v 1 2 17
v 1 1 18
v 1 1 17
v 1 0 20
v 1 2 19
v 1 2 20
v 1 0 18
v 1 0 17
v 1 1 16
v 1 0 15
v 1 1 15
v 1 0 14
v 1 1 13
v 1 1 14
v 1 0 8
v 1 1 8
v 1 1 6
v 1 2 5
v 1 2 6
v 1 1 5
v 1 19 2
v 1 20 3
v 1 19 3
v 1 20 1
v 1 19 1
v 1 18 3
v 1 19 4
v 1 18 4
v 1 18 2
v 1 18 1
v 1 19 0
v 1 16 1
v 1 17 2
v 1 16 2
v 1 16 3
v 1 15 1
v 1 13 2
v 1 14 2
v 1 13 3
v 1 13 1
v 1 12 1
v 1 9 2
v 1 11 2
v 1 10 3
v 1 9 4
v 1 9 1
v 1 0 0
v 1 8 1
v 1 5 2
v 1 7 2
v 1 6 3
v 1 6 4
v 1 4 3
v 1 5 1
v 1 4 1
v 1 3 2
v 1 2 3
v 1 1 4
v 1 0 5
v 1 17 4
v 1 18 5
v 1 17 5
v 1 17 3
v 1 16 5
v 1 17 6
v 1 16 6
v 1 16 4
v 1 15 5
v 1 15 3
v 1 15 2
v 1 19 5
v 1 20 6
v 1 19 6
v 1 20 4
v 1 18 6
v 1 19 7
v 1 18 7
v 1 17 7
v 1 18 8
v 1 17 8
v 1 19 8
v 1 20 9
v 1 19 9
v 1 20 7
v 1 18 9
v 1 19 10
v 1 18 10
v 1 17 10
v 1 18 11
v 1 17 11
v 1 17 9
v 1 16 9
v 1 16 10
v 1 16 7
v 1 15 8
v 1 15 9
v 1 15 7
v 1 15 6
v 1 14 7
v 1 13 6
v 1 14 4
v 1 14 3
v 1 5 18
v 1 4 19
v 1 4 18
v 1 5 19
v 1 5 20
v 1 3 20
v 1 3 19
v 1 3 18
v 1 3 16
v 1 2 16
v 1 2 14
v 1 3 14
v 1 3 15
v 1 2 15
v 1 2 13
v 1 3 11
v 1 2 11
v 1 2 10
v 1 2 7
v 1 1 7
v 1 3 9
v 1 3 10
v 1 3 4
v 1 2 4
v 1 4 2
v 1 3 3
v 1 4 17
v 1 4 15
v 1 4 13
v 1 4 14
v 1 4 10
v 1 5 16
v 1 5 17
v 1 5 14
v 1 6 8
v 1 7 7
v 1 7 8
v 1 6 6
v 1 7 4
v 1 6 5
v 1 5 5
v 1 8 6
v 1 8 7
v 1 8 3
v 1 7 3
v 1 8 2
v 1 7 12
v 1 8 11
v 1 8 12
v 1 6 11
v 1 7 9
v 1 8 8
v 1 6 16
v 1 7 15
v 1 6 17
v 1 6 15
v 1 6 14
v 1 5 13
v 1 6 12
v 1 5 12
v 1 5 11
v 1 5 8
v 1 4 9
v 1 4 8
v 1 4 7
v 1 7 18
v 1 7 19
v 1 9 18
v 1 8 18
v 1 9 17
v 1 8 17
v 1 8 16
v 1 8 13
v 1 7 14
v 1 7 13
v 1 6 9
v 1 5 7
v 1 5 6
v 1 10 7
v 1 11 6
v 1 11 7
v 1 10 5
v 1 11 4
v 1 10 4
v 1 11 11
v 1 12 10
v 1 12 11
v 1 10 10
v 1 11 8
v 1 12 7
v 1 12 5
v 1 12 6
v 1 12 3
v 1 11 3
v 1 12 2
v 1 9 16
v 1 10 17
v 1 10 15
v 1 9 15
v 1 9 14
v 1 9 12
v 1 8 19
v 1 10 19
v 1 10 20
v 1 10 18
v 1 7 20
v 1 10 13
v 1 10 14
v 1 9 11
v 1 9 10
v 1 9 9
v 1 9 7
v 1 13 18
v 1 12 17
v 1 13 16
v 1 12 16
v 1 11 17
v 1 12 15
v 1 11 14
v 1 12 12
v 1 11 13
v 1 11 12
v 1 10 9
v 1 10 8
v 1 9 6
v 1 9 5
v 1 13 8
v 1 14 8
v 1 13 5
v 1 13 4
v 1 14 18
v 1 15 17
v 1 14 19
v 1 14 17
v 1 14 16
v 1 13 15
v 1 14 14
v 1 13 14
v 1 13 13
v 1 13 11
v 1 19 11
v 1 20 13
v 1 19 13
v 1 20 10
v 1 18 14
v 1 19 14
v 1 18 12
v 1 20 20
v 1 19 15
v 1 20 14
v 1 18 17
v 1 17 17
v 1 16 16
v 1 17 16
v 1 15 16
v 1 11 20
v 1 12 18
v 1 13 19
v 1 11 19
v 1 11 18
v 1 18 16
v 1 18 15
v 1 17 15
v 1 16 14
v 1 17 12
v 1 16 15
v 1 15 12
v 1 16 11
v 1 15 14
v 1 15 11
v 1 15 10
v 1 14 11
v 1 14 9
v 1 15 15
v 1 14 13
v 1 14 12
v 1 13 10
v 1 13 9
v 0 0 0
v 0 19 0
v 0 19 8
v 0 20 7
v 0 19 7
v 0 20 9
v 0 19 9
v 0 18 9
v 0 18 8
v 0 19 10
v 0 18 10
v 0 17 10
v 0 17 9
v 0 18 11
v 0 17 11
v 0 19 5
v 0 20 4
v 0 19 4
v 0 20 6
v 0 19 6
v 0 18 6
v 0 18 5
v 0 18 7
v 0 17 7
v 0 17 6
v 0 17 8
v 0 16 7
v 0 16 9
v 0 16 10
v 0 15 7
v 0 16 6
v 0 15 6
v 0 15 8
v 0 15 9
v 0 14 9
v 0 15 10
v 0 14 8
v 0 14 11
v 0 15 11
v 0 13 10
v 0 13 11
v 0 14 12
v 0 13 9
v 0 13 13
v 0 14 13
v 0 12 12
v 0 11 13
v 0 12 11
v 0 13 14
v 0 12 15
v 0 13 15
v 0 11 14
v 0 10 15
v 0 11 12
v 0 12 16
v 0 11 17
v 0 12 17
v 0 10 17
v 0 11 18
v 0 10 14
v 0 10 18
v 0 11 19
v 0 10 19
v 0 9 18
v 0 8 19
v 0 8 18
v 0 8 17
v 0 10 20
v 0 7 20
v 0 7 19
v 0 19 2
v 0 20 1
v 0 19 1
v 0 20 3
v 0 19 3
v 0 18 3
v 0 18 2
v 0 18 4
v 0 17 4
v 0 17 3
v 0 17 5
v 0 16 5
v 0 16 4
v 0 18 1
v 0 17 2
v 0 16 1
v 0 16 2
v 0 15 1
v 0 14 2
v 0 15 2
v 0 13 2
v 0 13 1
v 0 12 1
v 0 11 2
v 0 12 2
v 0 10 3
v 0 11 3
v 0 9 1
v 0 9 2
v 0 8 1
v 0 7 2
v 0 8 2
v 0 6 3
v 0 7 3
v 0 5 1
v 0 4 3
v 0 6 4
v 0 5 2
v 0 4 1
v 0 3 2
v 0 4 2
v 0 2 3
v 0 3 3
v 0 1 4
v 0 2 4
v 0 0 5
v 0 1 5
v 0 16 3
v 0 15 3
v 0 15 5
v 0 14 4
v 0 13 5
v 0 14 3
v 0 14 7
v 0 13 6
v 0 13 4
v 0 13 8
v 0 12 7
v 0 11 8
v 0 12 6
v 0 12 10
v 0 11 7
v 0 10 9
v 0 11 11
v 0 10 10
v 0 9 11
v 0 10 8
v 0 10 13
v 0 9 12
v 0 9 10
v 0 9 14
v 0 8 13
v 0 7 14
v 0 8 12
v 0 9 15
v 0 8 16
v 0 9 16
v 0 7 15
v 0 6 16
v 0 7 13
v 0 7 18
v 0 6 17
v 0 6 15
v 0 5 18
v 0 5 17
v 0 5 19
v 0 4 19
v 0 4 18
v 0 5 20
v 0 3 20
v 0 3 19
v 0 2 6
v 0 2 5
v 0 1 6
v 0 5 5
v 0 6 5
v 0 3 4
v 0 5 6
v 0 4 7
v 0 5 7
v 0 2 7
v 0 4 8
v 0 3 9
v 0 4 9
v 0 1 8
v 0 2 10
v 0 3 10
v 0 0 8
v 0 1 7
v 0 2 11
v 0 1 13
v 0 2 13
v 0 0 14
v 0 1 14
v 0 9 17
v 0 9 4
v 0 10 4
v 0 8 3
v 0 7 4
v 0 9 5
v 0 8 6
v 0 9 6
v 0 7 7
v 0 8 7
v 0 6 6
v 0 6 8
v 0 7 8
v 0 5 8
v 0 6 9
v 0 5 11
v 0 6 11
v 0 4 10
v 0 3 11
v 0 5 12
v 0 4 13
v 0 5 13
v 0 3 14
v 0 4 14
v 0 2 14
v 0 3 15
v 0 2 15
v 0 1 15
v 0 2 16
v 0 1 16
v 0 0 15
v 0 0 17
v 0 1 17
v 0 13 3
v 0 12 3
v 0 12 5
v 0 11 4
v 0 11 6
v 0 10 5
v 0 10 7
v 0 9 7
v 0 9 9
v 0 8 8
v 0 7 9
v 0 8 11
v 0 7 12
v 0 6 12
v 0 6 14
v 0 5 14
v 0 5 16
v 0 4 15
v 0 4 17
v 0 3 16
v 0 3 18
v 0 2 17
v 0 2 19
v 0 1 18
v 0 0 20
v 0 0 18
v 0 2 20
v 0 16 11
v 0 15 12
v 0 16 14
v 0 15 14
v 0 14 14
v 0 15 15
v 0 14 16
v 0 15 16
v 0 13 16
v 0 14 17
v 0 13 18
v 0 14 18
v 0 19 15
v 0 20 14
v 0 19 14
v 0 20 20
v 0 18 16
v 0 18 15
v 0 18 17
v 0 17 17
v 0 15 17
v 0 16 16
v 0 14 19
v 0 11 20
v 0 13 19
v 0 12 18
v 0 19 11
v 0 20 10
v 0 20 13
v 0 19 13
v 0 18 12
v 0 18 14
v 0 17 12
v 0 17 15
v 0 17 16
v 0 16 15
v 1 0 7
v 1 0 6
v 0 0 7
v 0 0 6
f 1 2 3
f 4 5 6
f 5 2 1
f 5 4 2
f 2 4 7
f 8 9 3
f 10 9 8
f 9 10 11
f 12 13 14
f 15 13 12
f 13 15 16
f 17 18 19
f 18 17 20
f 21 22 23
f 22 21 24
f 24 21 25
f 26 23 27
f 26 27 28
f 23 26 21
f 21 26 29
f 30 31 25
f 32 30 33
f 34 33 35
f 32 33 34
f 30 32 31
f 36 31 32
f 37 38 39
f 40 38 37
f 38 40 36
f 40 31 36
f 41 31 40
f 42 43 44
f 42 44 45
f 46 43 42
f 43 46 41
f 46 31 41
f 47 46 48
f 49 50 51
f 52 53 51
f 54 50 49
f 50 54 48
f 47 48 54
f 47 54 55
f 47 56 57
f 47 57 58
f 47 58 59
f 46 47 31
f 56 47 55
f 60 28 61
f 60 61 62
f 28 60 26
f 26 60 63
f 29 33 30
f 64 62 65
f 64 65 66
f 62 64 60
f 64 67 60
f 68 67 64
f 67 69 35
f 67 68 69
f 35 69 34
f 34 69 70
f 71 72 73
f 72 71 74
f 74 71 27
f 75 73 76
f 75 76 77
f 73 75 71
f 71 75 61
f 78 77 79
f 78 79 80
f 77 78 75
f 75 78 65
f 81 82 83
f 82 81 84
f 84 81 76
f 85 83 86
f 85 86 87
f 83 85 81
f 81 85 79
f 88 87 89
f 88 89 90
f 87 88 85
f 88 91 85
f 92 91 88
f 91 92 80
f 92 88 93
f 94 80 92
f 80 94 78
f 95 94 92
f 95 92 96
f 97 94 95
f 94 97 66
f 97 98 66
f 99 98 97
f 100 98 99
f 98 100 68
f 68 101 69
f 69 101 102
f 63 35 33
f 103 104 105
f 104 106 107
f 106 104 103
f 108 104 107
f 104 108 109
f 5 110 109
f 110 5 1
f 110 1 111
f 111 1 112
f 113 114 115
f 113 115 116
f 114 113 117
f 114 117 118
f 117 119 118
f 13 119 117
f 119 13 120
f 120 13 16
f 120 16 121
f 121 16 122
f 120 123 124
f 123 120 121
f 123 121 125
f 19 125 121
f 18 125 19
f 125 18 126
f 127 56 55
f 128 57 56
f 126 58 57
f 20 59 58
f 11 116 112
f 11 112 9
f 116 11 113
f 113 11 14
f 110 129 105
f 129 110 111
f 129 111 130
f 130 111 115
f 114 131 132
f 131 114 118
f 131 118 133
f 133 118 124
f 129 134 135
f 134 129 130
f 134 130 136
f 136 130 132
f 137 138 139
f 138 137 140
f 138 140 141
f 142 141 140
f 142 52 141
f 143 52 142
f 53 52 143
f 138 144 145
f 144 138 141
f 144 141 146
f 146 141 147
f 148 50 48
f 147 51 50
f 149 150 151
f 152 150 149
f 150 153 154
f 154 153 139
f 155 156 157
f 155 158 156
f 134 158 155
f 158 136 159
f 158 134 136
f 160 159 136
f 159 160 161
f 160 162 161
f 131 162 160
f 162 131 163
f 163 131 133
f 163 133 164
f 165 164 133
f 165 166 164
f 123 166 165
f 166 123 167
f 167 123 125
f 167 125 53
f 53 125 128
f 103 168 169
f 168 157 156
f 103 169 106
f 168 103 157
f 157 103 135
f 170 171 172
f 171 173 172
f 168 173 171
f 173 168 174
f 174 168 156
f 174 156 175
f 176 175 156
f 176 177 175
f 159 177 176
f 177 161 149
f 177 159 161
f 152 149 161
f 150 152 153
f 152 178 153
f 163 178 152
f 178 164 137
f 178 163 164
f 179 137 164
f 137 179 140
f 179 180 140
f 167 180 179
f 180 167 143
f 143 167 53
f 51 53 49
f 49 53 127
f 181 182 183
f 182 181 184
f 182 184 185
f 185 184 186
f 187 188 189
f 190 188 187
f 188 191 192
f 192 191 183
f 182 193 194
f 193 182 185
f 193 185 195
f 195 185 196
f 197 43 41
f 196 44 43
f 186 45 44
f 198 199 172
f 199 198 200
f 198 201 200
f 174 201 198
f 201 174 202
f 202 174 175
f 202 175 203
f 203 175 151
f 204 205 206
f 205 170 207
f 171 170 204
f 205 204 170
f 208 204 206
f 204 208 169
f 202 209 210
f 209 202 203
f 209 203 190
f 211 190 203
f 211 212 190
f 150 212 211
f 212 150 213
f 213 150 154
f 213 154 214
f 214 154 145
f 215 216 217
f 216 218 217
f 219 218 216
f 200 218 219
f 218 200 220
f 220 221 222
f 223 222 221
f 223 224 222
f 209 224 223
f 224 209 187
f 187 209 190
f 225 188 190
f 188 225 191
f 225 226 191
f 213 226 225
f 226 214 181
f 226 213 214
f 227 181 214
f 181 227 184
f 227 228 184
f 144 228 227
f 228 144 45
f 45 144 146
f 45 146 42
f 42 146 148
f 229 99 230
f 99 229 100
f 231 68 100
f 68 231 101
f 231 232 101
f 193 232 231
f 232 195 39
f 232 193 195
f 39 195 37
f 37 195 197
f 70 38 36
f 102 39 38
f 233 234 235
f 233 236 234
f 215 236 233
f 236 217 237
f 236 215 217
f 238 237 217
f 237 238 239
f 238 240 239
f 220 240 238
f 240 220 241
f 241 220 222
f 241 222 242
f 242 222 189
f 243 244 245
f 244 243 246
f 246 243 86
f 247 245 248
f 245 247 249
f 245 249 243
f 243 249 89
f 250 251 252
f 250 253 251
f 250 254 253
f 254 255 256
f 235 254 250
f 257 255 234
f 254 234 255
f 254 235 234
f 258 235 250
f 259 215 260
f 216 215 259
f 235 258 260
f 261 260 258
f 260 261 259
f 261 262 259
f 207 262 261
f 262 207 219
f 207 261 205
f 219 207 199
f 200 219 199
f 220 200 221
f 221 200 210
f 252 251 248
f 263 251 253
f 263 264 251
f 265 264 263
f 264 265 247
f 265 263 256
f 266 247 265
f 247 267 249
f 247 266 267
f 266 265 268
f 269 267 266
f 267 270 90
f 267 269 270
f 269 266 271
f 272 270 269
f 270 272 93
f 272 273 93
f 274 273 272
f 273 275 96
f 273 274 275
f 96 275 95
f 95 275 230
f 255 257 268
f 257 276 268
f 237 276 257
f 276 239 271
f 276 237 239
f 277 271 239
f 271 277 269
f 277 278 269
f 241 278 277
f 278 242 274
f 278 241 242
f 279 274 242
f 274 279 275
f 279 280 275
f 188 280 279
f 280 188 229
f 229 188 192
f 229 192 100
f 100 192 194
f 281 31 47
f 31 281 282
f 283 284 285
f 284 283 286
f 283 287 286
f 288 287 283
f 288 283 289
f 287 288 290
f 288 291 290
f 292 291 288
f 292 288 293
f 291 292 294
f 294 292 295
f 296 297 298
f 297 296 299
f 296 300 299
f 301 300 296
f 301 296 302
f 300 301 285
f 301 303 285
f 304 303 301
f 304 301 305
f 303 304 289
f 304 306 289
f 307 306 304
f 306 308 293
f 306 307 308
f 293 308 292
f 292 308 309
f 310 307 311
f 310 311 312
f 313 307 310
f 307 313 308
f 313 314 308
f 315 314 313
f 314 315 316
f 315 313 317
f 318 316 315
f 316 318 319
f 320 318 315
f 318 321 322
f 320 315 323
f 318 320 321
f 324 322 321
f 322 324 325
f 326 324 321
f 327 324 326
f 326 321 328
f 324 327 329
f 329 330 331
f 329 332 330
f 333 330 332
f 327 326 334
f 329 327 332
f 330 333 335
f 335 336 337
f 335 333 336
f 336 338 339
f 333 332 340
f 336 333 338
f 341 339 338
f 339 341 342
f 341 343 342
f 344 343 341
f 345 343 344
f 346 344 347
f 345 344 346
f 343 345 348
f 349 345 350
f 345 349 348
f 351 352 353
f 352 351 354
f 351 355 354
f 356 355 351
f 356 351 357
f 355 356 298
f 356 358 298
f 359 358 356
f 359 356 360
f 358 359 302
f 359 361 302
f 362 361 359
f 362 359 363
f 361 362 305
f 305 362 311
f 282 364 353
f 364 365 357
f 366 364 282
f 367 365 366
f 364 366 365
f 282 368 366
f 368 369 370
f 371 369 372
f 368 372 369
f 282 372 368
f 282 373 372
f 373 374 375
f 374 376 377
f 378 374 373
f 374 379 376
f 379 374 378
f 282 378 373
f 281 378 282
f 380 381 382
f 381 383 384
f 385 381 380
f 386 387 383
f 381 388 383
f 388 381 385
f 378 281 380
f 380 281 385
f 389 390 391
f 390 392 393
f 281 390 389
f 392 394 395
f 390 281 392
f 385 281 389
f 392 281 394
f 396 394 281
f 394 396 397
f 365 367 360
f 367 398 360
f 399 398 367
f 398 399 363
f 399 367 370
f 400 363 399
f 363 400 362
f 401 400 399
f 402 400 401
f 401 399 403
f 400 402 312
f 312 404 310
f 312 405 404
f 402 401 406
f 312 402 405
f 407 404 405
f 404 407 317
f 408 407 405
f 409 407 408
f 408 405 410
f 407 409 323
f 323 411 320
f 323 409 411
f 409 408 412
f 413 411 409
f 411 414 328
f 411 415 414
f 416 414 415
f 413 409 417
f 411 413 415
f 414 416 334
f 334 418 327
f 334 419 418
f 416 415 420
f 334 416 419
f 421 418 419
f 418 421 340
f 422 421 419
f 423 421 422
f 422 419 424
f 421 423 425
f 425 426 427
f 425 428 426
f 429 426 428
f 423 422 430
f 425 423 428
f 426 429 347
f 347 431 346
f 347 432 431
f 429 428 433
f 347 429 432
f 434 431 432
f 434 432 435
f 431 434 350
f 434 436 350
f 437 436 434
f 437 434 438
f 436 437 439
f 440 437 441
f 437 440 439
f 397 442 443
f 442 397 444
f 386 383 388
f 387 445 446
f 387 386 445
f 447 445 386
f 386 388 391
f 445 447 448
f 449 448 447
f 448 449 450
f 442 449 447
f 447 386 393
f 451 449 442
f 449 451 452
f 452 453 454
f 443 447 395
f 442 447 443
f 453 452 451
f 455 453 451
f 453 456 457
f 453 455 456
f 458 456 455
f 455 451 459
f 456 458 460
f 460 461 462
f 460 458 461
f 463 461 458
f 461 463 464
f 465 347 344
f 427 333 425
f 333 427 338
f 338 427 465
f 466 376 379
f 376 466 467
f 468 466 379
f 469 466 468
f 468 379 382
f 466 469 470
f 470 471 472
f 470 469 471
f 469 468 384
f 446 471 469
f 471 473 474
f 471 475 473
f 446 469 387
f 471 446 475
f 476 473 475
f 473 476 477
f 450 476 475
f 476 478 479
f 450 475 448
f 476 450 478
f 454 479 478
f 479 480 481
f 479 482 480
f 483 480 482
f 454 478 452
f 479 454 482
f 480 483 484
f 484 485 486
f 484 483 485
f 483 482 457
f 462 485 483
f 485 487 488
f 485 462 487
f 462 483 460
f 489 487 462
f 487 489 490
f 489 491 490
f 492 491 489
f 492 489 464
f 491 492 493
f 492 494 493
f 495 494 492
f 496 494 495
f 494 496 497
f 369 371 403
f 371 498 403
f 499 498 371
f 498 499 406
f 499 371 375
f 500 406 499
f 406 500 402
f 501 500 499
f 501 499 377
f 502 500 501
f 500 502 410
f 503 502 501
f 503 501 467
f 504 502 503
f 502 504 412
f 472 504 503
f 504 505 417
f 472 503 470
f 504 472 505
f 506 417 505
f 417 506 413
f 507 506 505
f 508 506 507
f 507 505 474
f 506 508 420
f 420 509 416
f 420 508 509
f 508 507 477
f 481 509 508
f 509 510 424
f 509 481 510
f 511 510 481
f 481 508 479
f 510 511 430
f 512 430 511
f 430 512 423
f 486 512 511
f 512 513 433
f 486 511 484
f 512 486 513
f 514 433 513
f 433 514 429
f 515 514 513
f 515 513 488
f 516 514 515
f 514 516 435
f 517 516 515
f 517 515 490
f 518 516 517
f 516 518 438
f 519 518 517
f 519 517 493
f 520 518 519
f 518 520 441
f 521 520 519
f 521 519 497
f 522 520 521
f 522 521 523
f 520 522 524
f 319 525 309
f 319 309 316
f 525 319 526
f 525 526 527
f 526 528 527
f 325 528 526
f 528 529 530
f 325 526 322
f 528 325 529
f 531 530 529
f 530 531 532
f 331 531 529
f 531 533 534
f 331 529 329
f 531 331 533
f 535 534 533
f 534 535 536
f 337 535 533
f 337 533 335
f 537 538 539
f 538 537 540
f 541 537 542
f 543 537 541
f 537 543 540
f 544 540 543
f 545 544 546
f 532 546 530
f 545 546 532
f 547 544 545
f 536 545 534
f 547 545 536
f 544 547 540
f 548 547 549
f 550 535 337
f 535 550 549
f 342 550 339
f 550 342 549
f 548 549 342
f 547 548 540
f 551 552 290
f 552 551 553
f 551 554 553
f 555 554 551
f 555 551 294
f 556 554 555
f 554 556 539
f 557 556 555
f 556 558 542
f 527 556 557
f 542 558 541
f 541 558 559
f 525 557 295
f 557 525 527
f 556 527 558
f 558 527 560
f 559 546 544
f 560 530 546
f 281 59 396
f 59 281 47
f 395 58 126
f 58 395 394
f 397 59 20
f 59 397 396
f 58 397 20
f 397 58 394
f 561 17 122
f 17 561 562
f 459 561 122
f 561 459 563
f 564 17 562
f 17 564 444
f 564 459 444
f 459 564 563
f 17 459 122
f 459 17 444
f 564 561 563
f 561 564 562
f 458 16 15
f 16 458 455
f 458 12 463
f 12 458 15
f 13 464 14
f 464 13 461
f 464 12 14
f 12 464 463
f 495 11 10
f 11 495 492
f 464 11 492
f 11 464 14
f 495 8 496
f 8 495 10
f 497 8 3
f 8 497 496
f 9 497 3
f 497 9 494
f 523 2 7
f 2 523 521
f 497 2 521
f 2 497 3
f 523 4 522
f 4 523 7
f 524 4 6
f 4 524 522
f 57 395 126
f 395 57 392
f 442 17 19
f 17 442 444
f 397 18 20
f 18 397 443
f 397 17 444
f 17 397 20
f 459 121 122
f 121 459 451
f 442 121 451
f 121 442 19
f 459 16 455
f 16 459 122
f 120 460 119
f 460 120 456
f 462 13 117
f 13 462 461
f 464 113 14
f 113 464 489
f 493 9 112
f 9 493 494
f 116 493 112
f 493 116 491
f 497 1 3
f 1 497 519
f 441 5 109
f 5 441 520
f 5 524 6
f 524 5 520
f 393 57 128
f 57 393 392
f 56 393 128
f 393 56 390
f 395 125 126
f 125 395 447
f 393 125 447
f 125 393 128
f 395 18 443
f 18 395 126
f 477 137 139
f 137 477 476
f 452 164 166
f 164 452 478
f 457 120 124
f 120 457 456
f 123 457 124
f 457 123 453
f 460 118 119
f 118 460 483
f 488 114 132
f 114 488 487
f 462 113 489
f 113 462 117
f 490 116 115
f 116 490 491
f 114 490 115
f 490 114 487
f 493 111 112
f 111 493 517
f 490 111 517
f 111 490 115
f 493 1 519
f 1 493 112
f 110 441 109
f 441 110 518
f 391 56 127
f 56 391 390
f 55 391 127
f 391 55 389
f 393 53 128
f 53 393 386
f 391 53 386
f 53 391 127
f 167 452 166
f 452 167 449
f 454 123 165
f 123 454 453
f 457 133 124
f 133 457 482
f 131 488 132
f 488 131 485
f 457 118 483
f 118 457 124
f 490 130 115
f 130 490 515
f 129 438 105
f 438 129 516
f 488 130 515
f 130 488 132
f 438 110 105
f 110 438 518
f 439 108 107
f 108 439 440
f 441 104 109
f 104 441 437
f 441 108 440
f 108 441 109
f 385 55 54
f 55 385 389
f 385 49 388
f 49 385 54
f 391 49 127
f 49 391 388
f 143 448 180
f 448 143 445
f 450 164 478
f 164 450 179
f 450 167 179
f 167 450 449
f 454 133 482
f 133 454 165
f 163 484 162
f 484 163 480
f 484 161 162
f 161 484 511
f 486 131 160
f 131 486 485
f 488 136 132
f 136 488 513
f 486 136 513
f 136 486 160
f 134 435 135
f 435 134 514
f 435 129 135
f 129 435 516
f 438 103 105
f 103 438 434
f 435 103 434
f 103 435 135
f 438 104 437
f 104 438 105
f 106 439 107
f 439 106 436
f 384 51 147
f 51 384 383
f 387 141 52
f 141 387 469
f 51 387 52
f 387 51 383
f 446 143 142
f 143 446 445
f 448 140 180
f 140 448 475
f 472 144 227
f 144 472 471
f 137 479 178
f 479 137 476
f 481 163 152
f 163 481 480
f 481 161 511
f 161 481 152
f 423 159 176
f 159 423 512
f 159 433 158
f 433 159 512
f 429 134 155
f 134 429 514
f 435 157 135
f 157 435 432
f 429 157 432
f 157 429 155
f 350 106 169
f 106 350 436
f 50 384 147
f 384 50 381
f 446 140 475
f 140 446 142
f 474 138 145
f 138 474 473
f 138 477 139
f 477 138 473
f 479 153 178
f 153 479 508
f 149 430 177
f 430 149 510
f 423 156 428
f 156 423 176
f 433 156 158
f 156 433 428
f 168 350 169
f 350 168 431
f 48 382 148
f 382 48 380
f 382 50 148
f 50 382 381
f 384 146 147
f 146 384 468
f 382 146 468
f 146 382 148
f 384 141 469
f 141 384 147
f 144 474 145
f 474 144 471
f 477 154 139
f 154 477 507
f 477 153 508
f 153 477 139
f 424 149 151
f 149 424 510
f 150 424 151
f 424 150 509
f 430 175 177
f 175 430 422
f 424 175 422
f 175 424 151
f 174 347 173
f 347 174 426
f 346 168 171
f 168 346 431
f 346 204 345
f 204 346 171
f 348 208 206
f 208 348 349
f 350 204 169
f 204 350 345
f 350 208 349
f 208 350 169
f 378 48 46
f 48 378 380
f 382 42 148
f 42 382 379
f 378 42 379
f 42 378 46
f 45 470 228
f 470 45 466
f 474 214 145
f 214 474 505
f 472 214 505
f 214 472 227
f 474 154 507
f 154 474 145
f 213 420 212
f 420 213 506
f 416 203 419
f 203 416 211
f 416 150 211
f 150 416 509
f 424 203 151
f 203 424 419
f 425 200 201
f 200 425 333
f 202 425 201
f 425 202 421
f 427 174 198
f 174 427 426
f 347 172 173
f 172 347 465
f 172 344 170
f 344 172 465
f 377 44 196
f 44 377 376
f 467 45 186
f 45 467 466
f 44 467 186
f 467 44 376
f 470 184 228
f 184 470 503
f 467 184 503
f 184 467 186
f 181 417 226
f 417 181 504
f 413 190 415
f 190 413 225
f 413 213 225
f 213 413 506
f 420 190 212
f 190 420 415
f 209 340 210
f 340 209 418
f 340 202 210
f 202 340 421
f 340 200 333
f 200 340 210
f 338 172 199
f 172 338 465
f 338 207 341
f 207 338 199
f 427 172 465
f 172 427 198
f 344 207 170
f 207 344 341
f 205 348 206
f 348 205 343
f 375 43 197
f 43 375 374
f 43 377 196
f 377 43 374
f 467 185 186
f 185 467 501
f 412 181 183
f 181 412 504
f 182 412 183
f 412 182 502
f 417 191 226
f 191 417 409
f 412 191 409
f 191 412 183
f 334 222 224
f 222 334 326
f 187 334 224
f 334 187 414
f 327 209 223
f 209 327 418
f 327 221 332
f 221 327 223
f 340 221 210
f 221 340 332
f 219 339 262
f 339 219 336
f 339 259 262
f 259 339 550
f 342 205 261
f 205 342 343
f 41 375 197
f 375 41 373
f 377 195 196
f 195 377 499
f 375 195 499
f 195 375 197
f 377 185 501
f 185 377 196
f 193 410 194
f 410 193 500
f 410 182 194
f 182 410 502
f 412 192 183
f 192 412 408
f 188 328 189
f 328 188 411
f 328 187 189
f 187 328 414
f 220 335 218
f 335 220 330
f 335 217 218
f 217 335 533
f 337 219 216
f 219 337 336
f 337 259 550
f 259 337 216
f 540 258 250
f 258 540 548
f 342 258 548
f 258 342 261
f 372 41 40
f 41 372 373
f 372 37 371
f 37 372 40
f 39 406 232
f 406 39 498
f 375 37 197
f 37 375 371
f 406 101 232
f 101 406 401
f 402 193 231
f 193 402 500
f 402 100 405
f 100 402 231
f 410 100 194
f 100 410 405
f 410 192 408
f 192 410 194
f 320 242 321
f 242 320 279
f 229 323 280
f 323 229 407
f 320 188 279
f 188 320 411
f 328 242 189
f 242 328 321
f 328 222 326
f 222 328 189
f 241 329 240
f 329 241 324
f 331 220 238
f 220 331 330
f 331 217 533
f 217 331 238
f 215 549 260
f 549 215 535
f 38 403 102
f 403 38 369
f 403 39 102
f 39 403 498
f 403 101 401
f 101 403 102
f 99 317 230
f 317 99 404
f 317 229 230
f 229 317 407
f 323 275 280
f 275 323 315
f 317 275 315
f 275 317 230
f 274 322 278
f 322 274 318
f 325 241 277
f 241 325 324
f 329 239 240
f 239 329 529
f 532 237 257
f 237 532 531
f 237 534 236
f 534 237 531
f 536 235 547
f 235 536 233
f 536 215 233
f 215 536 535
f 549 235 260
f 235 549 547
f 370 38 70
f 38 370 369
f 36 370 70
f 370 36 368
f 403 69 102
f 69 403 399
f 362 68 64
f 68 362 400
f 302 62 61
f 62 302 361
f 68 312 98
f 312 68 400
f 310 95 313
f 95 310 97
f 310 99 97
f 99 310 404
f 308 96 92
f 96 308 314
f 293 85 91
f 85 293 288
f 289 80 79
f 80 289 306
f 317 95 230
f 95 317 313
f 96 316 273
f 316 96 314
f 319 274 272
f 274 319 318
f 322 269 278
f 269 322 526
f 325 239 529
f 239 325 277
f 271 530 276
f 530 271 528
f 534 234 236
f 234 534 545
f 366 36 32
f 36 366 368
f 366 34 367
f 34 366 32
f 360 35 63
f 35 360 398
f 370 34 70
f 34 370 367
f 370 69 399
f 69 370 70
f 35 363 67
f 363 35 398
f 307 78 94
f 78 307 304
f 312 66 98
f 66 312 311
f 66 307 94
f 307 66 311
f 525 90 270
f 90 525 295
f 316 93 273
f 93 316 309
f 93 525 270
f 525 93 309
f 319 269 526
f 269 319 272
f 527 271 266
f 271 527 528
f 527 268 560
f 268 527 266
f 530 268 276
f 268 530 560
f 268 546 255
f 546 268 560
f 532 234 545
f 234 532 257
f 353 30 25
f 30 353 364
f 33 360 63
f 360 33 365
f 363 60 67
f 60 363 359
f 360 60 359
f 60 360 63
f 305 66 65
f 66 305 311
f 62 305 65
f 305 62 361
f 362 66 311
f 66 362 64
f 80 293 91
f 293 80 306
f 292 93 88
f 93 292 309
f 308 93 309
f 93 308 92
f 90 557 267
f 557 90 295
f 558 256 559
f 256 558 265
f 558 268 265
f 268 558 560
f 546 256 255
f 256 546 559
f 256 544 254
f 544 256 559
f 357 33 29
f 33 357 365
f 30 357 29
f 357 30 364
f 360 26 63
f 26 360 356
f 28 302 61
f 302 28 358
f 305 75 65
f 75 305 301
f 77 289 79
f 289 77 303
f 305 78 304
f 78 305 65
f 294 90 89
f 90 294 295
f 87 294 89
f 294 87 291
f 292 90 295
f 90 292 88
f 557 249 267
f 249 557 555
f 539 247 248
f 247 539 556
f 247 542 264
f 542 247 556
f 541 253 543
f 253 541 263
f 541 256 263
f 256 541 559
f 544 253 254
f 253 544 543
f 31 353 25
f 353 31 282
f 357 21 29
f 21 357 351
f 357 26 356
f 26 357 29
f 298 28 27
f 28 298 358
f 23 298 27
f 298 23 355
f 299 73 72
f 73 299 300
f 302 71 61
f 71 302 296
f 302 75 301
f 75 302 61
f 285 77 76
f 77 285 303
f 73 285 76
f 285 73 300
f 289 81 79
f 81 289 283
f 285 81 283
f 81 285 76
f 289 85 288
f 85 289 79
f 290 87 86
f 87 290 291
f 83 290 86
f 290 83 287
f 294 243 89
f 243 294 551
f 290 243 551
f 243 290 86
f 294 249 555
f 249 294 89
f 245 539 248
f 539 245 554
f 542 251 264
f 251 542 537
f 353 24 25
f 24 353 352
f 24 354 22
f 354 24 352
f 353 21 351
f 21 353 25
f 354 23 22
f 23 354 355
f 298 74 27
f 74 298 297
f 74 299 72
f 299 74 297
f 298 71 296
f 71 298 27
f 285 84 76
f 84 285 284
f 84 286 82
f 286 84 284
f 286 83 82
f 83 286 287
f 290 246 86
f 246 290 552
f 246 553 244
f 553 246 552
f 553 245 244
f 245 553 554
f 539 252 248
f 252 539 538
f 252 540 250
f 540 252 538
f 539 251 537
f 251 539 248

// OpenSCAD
union() {
    translate([0, 0, 0]) cube([1, 1, 1]);
    translate([0, 0, 1]) cube([1, 1, 1]);
    translate([0, 0, 2]) cube([1, 1, 1]);
    translate([0, 0, 3]) cube([1, 1, 1]);
    translate([0, 0, 4]) cube([1, 1, 1]);
    translate([0, 0, 6]) cube([1, 1, 1]);
    translate([0, 0, 8]) cube([1, 1, 1]);
    translate([0, 0, 9]) cube([1, 1, 1]);
    translate([0, 0, 10]) cube([1, 1, 1]);
    translate([0, 0, 11]) cube([1, 1, 1]);
    translate([0, 0, 12]) cube([1, 1, 1]);
    translate([0, 0, 13]) cube([1, 1, 1]);
    translate([0, 0, 15]) cube([1, 1, 1]);
    translate([0, 0, 16]) cube([1, 1, 1]);
    translate([0, 0, 18]) cube([1, 1, 1]);
    translate([0, 0, 19]) cube([1, 1, 1]);
    translate([0, 1, 0]) cube([1, 1, 1]);
    translate([0, 1, 1]) cube([1, 1, 1]);
    translate([0, 1, 2]) cube([1, 1, 1]);
    translate([0, 1, 3]) cube([1, 1, 1]);
    translate([0, 1, 5]) cube([1, 1, 1]);
    translate([0, 1, 7]) cube([1, 1, 1]);
    translate([0, 1, 8]) cube([1, 1, 1]);
    translate([0, 1, 9]) cube([1, 1, 1]);
    translate([0, 1, 10]) cube([1, 1, 1]);
    translate([0, 1, 11]) cube([1, 1, 1]);
    translate([0, 1, 12]) cube([1, 1, 1]);
    translate([0, 1, 14]) cube([1, 1, 1]);
    translate([0, 1, 15]) cube([1, 1, 1]);
    translate([0, 1, 17]) cube([1, 1, 1]);
    translate([0, 1, 18]) cube([1, 1, 1]);
    translate([0, 1, 19]) cube([1, 1, 1]);
    translate([0, 2, 0]) cube([1, 1, 1]);
    translate([0, 2, 1]) cube([1, 1, 1]);
    translate([0, 2, 2]) cube([1, 1, 1]);
    translate([0, 2, 4]) cube([1, 1, 1]);
    translate([0, 2, 5]) cube([1, 1, 1]);
    translate([0, 2, 6]) cube([1, 1, 1]);
    translate([0, 2, 7]) cube([1, 1, 1]);
    translate([0, 2, 8]) cube([1, 1, 1]);
    translate([0, 2, 9]) cube([1, 1, 1]);
    translate([0, 2, 11]) cube([1, 1, 1]);
    translate([0, 2, 12]) cube([1, 1, 1]);
    translate([0, 2, 13]) cube([1, 1, 1]);
    translate([0, 2, 14]) cube([1, 1, 1]);
    translate([0, 2, 16]) cube([1, 1, 1]);
    translate([0, 2, 17]) cube([1, 1, 1]);
    translate([0, 2, 18]) cube([1, 1, 1]);
    translate([0, 3, 0]) cube([1, 1, 1]);
    translate([0, 3, 1]) cube([1, 1, 1]);
    translate([0, 3, 3]) cube([1, 1, 1]);
    translate([0, 3, 4]) cube([1, 1, 1]);
    translate([0, 3, 5]) cube([1, 1, 1]);
    translate([0, 3, 6]) cube([1, 1, 1]);
    translate([0, 3, 7]) cube([1, 1, 1]);
    translate([0, 3, 8]) cube([1, 1, 1]);
    translate([0, 3, 10]) cube([1, 1, 1]);
    translate([0, 3, 11]) cube([1, 1, 1]);
    translate([0, 3, 12]) cube([1, 1, 1]);
    translate([0, 3, 13]) cube([1, 1, 1]);
    translate([0, 3, 15]) cube([1, 1, 1]);
    translate([0, 3, 16]) cube([1, 1, 1]);
    translate([0, 3, 17]) cube([1, 1, 1]);
    translate([0, 3, 19]) cube([1, 1, 1]);
    translate([0, 4, 0]) cube([1, 1, 1]);
    translate([0, 4, 2]) cube([1, 1, 1]);
    translate([0, 4, 3]) cube([1, 1, 1]);
    translate([0, 4, 4]) cube([1, 1, 1]);
    translate([0, 4, 5]) cube([1, 1, 1]);
    translate([0, 4, 6]) cube([1, 1, 1]);
    translate([0, 4, 8]) cube([1, 1, 1]);
    translate([0, 4, 9]) cube([1, 1, 1]);
    translate([0, 4, 10]) cube([1, 1, 1]);
    translate([0, 4, 11]) cube([1, 1, 1]);
    translate([0, 4, 12]) cube([1, 1, 1]);
    translate([0, 4, 14]) cube([1, 1, 1]);
    translate([0, 4, 15]) cube([1, 1, 1]);
    translate([0, 4, 16]) cube([1, 1, 1]);
    translate([0, 4, 18]) cube([1, 1, 1]);
    translate([0, 4, 19]) cube([1, 1, 1]);
    translate([0, 5, 0]) cube([1, 1, 1]);
    translate([0, 5, 1]) cube([1, 1, 1]);
    translate([0, 5, 2]) cube([1, 1, 1]);
    translate([0, 5, 3]) cube([1, 1, 1]);
    translate([0, 5, 4]) cube([1, 1, 1]);
    translate([0, 5, 6]) cube([1, 1, 1]);
    translate([0, 5, 7]) cube([1, 1, 1]);
    translate([0, 5, 8]) cube([1, 1, 1]);
    translate([0, 5, 9]) cube([1, 1, 1]);
    translate([0, 5, 10]) cube([1, 1, 1]);
    translate([0, 5, 12]) cube([1, 1, 1]);
    translate([0, 5, 13]) cube([1, 1, 1]);
    translate([0, 5, 14]) cube([1, 1, 1]);
    translate([0, 5, 15]) cube([1, 1, 1]);
    translate([0, 5, 17]) cube([1, 1, 1]);
    translate([0, 5, 18]) cube([1, 1, 1]);
    translate([0, 6, 0]) cube([1, 1, 1]);
    translate([0, 6, 1]) cube([1, 1, 1]);
    translate([0, 6, 2]) cube([1, 1, 1]);
    translate([0, 6, 4]) cube([1, 1, 1]);
    translate([0, 6, 5]) cube([1, 1, 1]);
    translate([0, 6, 6]) cube([1, 1, 1]);
    translate([0, 6, 7]) cube([1, 1, 1]);
    translate([0, 6, 9]) cube([1, 1, 1]);
    translate([0, 6, 10]) cube([1, 1, 1]);
    translate([0, 6, 11]) cube([1, 1, 1]);
    translate([0, 6, 12]) cube([1, 1, 1]);
    translate([0, 6, 13]) cube([1, 1, 1]);
    translate([0, 6, 15]) cube([1, 1, 1]);
    translate([0, 6, 16]) cube([1, 1, 1]);
    translate([0, 6, 17]) cube([1, 1, 1]);
    translate([0, 6, 18]) cube([1, 1, 1]);
    translate([0, 7, 0]) cube([1, 1, 1]);
    translate([0, 7, 1]) cube([1, 1, 1]);
    translate([0, 7, 3]) cube([1, 1, 1]);
    translate([0, 7, 4]) cube([1, 1, 1]);
    translate([0, 7, 5]) cube([1, 1, 1]);
    translate([0, 7, 6]) cube([1, 1, 1]);
    translate([0, 7, 8]) cube([1, 1, 1]);
    translate([0, 7, 9]) cube([1, 1, 1]);
    translate([0, 7, 10]) cube([1, 1, 1]);
    translate([0, 7, 11]) cube([1, 1, 1]);
    translate([0, 7, 13]) cube([1, 1, 1]);
    translate([0, 7, 14]) cube([1, 1, 1]);
    translate([0, 7, 15]) cube([1, 1, 1]);
    translate([0, 7, 16]) cube([1, 1, 1]);
    translate([0, 7, 17]) cube([1, 1, 1]);
    translate([0, 7, 19]) cube([1, 1, 1]);
    translate([0, 8, 0]) cube([1, 1, 1]);
    translate([0, 8, 2]) cube([1, 1, 1]);
    translate([0, 8, 3]) cube([1, 1, 1]);
    translate([0, 8, 4]) cube([1, 1, 1]);
    translate([0, 8, 5]) cube([1, 1, 1]);
    translate([0, 8, 7]) cube([1, 1, 1]);
    translate([0, 8, 8]) cube([1, 1, 1]);
    translate([0, 8, 9]) cube([1, 1, 1]);
    translate([0, 8, 10]) cube([1, 1, 1]);
    translate([0, 8, 12]) cube([1, 1, 1]);
    translate([0, 8, 13]) cube([1, 1, 1]);
    translate([0, 8, 14]) cube([1, 1, 1]);
    translate([0, 8, 15]) cube([1, 1, 1]);
    translate([0, 8, 17]) cube([1, 1, 1]);
    translate([0, 8, 18]) cube([1, 1, 1]);
    translate([0, 8, 19]) cube([1, 1, 1]);
    translate([0, 9, 0]) cube([1, 1, 1]);
    translate([0, 9, 1]) cube([1, 1, 1]);
    translate([0, 9, 2]) cube([1, 1, 1]);
    translate([0, 9, 3]) cube([1, 1, 1]);
    translate([0, 9, 5]) cube([1, 1, 1]);
    translate([0, 9, 6]) cube([1, 1, 1]);
    translate([0, 9, 7]) cube([1, 1, 1]);
    translate([0, 9, 8]) cube([1, 1, 1]);
    translate([0, 9, 10]) cube([1, 1, 1]);
    translate([0, 9, 11]) cube([1, 1, 1]);
    translate([0, 9, 12]) cube([1, 1, 1]);
    translate([0, 9, 13]) cube([1, 1, 1]);
    translate([0, 9, 15]) cube([1, 1, 1]);
    translate([0, 9, 16]) cube([1, 1, 1]);
    translate([0, 9, 18]) cube([1, 1, 1]);
    translate([0, 9, 19]) cube([1, 1, 1]);
    translate([0, 10, 0]) cube([1, 1, 1]);
    translate([0, 10, 1]) cube([1, 1, 1]);
    translate([0, 10, 2]) cube([1, 1, 1]);
    translate([0, 10, 4]) cube([1, 1, 1]);
    translate([0, 10, 5]) cube([1, 1, 1]);
    translate([0, 10, 6]) cube([1, 1, 1]);
    translate([0, 10, 8]) cube([1, 1, 1]);
    translate([0, 10, 9]) cube([1, 1, 1]);
    translate([0, 10, 10]) cube([1, 1, 1]);
    translate([0, 10, 11]) cube([1, 1, 1]);
    translate([0, 10, 12]) cube([1, 1, 1]);
    translate([0, 10, 14]) cube([1, 1, 1]);
    translate([0, 10, 15]) cube([1, 1, 1]);
    translate([0, 10, 16]) cube([1, 1, 1]);
    translate([0, 10, 17]) cube([1, 1, 1]);
    translate([0, 10, 18]) cube([1, 1, 1]);
    translate([0, 11, 0]) cube([1, 1, 1]);
    translate([0, 11, 1]) cube([1, 1, 1]);
    translate([0, 11, 3]) cube([1, 1, 1]);
    translate([0, 11, 4]) cube([1, 1, 1]);
    translate([0, 11, 5]) cube([1, 1, 1]);
    translate([0, 11, 7]) cube([1, 1, 1]);
    translate([0, 11, 8]) cube([1, 1, 1]);
    translate([0, 11, 9]) cube([1, 1, 1]);
    translate([0, 11, 10]) cube([1, 1, 1]);
    translate([0, 11, 12]) cube([1, 1, 1]);
    translate([0, 11, 13]) cube([1, 1, 1]);
    translate([0, 11, 14]) cube([1, 1, 1]);
    translate([0, 11, 15]) cube([1, 1, 1]);
    translate([0, 11, 16]) cube([1, 1, 1]);
    translate([0, 11, 18]) cube([1, 1, 1]);
    translate([0, 11, 19]) cube([1, 1, 1]);
    translate([0, 12, 0]) cube([1, 1, 1]);
    translate([0, 12, 2]) cube([1, 1, 1]);
    translate([0, 12, 3]) cube([1, 1, 1]);
    translate([0, 12, 4]) cube([1, 1, 1]);
    translate([0, 12, 6]) cube([1, 1, 1]);
    translate([0, 12, 7]) cube([1, 1, 1]);
    translate([0, 12, 8]) cube([1, 1, 1]);
    translate([0, 12, 9]) cube([1, 1, 1]);
    translate([0, 12, 11]) cube([1, 1, 1]);
    translate([0, 12, 12]) cube([1, 1, 1]);
    translate([0, 12, 13]) cube([1, 1, 1]);
    translate([0, 12, 14]) cube([1, 1, 1]);
    translate([0, 12, 16]) cube([1, 1, 1]);
    translate([0, 12, 17]) cube([1, 1, 1]);
    translate([0, 12, 18]) cube([1, 1, 1]);
    translate([0, 12, 19]) cube([1, 1, 1]);
    translate([0, 13, 0]) cube([1, 1, 1]);
    translate([0, 13, 1]) cube([1, 1, 1]);
    translate([0, 13, 2]) cube([1, 1, 1]);
    translate([0, 13, 4]) cube([1, 1, 1]);
    translate([0, 13, 5]) cube([1, 1, 1]);
    translate([0, 13, 6]) cube([1, 1, 1]);
    translate([0, 13, 7]) cube([1, 1, 1]);
    translate([0, 13, 9]) cube([1, 1, 1]);
    translate([0, 13, 10]) cube([1, 1, 1]);
    translate([0, 13, 11]) cube([1, 1, 1]);
    translate([0, 13, 12]) cube([1, 1, 1]);
    translate([0, 13, 14]) cube([1, 1, 1]);
    translate([0, 13, 15]) cube([1, 1, 1]);
    translate([0, 13, 16]) cube([1, 1, 1]);
    translate([0, 13, 17]) cube([1, 1, 1]);
    translate([0, 13, 19]) cube([1, 1, 1]);
    translate([0, 14, 0]) cube([1, 1, 1]);
    translate([0, 14, 1]) cube([1, 1, 1]);
    translate([0, 14, 3]) cube([1, 1, 1]);
    translate([0, 14, 4]) cube([1, 1, 1]);
    translate([0, 14, 5]) cube([1, 1, 1]);
    translate([0, 14, 6]) cube([1, 1, 1]);
    translate([0, 14, 8]) cube([1, 1, 1]);
    translate([0, 14, 9]) cube([1, 1, 1]);
    translate([0, 14, 10]) cube([1, 1, 1]);
    translate([0, 14, 12]) cube([1, 1, 1]);
    translate([0, 14, 13]) cube([1, 1, 1]);
    translate([0, 14, 14]) cube([1, 1, 1]);
    translate([0, 14, 15]) cube([1, 1, 1]);
    translate([0, 14, 17]) cube([1, 1, 1]);
    translate([0, 14, 18]) cube([1, 1, 1]);
    translate([0, 14, 19]) cube([1, 1, 1]);
    translate([0, 15, 0]) cube([1, 1, 1]);
    translate([0, 15, 2]) cube([1, 1, 1]);
    translate([0, 15, 3]) cube([1, 1, 1]);
    translate([0, 15, 4]) cube([1, 1, 1]);
    translate([0, 15, 6]) cube([1, 1, 1]);
    translate([0, 15, 7]) cube([1, 1, 1]);
    translate([0, 15, 8]) cube([1, 1, 1]);
    translate([0, 15, 10]) cube([1, 1, 1]);
    translate([0, 15, 11]) cube([1, 1, 1]);
    translate([0, 15, 12]) cube([1, 1, 1]);
    translate([0, 15, 13]) cube([1, 1, 1]);
    translate([0, 15, 15]) cube([1, 1, 1]);
    translate([0, 15, 16]) cube([1, 1, 1]);
    translate([0, 15, 17]) cube([1, 1, 1]);
    translate([0, 15, 18]) cube([1, 1, 1]);
    translate([0, 15, 19]) cube([1, 1, 1]);
    translate([0, 16, 0]) cube([1, 1, 1]);
    translate([0, 16, 1]) cube([1, 1, 1]);
    translate([0, 16, 2]) cube([1, 1, 1]);
    translate([0, 16, 4]) cube([1, 1, 1]);
    translate([0, 16, 5]) cube([1, 1, 1]);
    translate([0, 16, 7]) cube([1, 1, 1]);
    translate([0, 16, 8]) cube([1, 1, 1]);
    translate([0, 16, 9]) cube([1, 1, 1]);
    translate([0, 16, 11]) cube([1, 1, 1]);
    translate([0, 16, 12]) cube([1, 1, 1]);
    translate([0, 16, 13]) cube([1, 1, 1]);
    translate([0, 16, 14]) cube([1, 1, 1]);
    translate([0, 16, 16]) cube([1, 1, 1]);
    translate([0, 16, 17]) cube([1, 1, 1]);
    translate([0, 16, 18]) cube([1, 1, 1]);
    translate([0, 16, 19]) cube([1, 1, 1]);
    translate([0, 17, 0]) cube([1, 1, 1]);
    translate([0, 17, 1]) cube([1, 1, 1]);
    translate([0, 17, 3]) cube([1, 1, 1]);
    translate([0, 17, 4]) cube([1, 1, 1]);
    translate([0, 17, 6]) cube([1, 1, 1]);
    translate([0, 17, 7]) cube([1, 1, 1]);
    translate([0, 17, 9]) cube([1, 1, 1]);
    translate([0, 17, 10]) cube([1, 1, 1]);
    translate([0, 17, 12]) cube([1, 1, 1]);
    translate([0, 17, 13]) cube([1, 1, 1]);
    translate([0, 17, 14]) cube([1, 1, 1]);
    translate([0, 17, 15]) cube([1, 1, 1]);
    translate([0, 17, 17]) cube([1, 1, 1]);
    translate([0, 17, 18]) cube([1, 1, 1]);
    translate([0, 17, 19]) cube([1, 1, 1]);
    translate([0, 18, 0]) cube([1, 1, 1]);
    translate([0, 18, 2]) cube([1, 1, 1]);
    translate([0, 18, 3]) cube([1, 1, 1]);
    translate([0, 18, 5]) cube([1, 1, 1]);
    translate([0, 18, 6]) cube([1, 1, 1]);
    translate([0, 18, 8]) cube([1, 1, 1]);
    translate([0, 18, 9]) cube([1, 1, 1]);
    translate([0, 18, 11]) cube([1, 1, 1]);
    translate([0, 18, 12]) cube([1, 1, 1]);
    translate([0, 18, 13]) cube([1, 1, 1]);
    translate([0, 18, 15]) cube([1, 1, 1]);
    translate([0, 18, 16]) cube([1, 1, 1]);
    translate([0, 18, 17]) cube([1, 1, 1]);
    translate([0, 18, 18]) cube([1, 1, 1]);
    translate([0, 18, 19]) cube([1, 1, 1]);
    translate([0, 19, 1]) cube([1, 1, 1]);
    translate([0, 19, 2]) cube([1, 1, 1]);
    translate([0, 19, 4]) cube([1, 1, 1]);
    translate([0, 19, 5]) cube([1, 1, 1]);
    translate([0, 19, 7]) cube([1, 1, 1]);
    translate([0, 19, 8]) cube([1, 1, 1]);
    translate([0, 19, 10]) cube([1, 1, 1]);
    translate([0, 19, 11]) cube([1, 1, 1]);
    translate([0, 19, 12]) cube([1, 1, 1]);
    translate([0, 19, 14]) cube([1, 1, 1]);
    translate([0, 19, 15]) cube([1, 1, 1]);
    translate([0, 19, 16]) cube([1, 1, 1]);
    translate([0, 19, 17]) cube([1, 1, 1]);
    translate([0, 19, 18]) cube([1, 1, 1]);
    translate([0, 19, 19]) cube([1, 1, 1]);
}
